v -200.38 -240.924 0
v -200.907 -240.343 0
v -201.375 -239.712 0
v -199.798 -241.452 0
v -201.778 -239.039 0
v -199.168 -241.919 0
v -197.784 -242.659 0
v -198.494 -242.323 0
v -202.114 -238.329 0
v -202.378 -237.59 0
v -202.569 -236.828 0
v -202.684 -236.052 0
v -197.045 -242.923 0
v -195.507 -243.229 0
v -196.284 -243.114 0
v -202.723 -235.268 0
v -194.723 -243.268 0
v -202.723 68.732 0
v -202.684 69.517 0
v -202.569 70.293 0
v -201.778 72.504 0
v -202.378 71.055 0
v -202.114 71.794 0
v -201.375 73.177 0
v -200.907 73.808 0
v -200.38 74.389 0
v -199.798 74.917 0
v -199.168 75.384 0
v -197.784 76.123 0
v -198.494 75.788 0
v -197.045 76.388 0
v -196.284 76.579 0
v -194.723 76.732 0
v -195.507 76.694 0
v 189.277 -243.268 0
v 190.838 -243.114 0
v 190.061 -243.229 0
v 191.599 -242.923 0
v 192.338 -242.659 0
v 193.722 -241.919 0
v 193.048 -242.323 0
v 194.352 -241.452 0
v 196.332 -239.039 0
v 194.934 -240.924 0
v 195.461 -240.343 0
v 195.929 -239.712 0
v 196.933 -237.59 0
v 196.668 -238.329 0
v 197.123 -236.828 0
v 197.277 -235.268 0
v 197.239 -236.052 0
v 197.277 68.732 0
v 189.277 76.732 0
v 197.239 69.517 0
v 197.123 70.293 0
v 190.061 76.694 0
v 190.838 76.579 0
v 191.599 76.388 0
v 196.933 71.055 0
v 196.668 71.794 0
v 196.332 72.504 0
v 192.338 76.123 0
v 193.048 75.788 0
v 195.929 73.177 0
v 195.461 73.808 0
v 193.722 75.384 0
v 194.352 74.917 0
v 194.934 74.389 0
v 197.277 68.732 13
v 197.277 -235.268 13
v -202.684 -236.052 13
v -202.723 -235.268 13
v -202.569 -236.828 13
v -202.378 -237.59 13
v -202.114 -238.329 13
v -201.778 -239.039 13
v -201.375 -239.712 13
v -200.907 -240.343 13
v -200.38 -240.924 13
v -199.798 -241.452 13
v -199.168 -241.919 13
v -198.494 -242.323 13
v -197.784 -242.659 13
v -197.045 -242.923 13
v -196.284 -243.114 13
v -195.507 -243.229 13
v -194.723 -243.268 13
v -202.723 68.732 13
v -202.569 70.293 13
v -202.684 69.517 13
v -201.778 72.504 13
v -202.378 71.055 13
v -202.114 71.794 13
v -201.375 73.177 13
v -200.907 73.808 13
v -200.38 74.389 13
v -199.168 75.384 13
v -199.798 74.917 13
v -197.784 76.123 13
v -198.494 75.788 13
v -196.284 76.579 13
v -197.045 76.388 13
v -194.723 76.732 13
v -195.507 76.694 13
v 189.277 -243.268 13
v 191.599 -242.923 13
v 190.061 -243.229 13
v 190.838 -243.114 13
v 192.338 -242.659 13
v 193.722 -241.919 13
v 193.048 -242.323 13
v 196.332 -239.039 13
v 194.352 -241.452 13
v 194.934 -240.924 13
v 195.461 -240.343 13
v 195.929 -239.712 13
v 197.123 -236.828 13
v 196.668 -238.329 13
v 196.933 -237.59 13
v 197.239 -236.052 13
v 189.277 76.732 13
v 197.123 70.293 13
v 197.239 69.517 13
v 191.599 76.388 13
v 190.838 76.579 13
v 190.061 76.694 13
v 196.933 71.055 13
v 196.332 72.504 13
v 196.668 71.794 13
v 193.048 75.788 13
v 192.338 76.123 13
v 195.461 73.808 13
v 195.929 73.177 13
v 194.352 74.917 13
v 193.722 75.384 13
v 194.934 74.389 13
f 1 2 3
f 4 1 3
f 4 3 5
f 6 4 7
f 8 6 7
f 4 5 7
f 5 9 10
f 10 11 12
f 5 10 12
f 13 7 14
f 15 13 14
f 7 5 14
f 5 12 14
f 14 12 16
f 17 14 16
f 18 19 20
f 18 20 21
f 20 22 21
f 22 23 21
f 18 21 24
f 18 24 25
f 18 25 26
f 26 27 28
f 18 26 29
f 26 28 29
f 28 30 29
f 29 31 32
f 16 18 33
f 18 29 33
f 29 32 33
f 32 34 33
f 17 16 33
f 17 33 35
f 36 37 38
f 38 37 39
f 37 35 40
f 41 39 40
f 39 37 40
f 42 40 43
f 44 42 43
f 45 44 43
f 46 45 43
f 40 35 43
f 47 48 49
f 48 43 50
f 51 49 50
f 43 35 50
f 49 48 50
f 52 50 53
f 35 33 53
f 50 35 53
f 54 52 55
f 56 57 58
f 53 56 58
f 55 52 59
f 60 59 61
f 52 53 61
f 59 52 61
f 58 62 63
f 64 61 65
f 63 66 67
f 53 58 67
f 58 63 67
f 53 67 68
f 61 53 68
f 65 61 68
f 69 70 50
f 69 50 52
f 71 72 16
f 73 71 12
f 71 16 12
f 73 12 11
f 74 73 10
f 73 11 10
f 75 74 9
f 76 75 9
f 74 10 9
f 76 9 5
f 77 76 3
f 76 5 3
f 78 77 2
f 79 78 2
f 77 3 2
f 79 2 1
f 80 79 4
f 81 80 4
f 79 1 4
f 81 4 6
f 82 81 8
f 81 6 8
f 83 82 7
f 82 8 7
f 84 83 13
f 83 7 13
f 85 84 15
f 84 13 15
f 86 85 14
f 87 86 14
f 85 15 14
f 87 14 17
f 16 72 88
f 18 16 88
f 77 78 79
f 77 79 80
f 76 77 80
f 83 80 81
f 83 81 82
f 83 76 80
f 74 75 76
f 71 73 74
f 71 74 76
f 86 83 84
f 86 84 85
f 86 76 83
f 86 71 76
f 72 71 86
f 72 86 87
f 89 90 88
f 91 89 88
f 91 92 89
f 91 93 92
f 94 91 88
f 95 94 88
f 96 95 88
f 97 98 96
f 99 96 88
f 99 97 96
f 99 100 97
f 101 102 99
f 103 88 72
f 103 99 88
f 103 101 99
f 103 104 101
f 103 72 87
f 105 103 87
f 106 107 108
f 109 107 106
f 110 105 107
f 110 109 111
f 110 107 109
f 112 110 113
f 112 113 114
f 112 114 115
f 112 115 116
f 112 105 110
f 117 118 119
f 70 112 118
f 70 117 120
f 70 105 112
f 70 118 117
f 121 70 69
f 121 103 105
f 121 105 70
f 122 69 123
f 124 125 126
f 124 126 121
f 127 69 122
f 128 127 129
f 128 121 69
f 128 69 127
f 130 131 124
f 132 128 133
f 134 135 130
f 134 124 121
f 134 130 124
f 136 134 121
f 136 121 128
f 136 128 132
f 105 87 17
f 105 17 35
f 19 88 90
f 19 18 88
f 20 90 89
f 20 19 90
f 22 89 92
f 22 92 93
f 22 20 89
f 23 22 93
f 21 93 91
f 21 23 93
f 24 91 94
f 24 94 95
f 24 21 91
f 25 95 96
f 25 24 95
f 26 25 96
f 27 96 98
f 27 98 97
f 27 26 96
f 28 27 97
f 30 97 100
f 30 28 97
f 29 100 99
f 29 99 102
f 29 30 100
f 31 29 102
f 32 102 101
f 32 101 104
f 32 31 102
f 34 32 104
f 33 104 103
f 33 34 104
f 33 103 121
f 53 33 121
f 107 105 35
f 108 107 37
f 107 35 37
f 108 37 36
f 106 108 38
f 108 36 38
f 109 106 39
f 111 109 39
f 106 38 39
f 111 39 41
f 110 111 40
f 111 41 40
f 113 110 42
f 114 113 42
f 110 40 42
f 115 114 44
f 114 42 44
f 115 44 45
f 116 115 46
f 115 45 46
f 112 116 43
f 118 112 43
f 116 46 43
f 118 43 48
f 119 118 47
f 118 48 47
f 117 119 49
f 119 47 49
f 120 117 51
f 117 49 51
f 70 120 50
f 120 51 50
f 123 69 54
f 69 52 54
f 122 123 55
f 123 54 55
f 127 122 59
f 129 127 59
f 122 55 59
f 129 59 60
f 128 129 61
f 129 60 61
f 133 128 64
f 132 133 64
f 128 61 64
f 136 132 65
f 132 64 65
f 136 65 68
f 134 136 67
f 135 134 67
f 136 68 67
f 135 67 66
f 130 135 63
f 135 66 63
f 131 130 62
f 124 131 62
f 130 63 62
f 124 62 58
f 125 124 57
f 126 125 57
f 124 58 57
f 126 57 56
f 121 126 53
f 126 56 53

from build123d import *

# Parameters (mm, degrees)
SKETCH_1_W      = 400
SKETCH_1_H      = 320
EXTRUDE_1_DEPTH = 13
FILLET_1_R      = 8


with BuildPart() as part:
    # 스케치1 → 보스-돌출1 (new body)
    with BuildSketch(Plane.XY.offset(13)):
        with Locations((-2.722973759, -83.26756851)):
            Rectangle(SKETCH_1_W, SKETCH_1_H)
    extrude(amount=-EXTRUDE_1_DEPTH)

    # 필렛1
    fillet_1_edges = [part.edges().sort_by_distance(p)[0] for p in [
        (197.277026241, 76.73243149, 6.5),
        (197.277026241, -243.26756851, 6.5),
        (-202.722973759, -243.26756851, 6.5),
        (-202.722973759, 76.73243149, 6.5),
    ]]
    fillet(fillet_1_edges, radius=FILLET_1_R)


solid = part.part
